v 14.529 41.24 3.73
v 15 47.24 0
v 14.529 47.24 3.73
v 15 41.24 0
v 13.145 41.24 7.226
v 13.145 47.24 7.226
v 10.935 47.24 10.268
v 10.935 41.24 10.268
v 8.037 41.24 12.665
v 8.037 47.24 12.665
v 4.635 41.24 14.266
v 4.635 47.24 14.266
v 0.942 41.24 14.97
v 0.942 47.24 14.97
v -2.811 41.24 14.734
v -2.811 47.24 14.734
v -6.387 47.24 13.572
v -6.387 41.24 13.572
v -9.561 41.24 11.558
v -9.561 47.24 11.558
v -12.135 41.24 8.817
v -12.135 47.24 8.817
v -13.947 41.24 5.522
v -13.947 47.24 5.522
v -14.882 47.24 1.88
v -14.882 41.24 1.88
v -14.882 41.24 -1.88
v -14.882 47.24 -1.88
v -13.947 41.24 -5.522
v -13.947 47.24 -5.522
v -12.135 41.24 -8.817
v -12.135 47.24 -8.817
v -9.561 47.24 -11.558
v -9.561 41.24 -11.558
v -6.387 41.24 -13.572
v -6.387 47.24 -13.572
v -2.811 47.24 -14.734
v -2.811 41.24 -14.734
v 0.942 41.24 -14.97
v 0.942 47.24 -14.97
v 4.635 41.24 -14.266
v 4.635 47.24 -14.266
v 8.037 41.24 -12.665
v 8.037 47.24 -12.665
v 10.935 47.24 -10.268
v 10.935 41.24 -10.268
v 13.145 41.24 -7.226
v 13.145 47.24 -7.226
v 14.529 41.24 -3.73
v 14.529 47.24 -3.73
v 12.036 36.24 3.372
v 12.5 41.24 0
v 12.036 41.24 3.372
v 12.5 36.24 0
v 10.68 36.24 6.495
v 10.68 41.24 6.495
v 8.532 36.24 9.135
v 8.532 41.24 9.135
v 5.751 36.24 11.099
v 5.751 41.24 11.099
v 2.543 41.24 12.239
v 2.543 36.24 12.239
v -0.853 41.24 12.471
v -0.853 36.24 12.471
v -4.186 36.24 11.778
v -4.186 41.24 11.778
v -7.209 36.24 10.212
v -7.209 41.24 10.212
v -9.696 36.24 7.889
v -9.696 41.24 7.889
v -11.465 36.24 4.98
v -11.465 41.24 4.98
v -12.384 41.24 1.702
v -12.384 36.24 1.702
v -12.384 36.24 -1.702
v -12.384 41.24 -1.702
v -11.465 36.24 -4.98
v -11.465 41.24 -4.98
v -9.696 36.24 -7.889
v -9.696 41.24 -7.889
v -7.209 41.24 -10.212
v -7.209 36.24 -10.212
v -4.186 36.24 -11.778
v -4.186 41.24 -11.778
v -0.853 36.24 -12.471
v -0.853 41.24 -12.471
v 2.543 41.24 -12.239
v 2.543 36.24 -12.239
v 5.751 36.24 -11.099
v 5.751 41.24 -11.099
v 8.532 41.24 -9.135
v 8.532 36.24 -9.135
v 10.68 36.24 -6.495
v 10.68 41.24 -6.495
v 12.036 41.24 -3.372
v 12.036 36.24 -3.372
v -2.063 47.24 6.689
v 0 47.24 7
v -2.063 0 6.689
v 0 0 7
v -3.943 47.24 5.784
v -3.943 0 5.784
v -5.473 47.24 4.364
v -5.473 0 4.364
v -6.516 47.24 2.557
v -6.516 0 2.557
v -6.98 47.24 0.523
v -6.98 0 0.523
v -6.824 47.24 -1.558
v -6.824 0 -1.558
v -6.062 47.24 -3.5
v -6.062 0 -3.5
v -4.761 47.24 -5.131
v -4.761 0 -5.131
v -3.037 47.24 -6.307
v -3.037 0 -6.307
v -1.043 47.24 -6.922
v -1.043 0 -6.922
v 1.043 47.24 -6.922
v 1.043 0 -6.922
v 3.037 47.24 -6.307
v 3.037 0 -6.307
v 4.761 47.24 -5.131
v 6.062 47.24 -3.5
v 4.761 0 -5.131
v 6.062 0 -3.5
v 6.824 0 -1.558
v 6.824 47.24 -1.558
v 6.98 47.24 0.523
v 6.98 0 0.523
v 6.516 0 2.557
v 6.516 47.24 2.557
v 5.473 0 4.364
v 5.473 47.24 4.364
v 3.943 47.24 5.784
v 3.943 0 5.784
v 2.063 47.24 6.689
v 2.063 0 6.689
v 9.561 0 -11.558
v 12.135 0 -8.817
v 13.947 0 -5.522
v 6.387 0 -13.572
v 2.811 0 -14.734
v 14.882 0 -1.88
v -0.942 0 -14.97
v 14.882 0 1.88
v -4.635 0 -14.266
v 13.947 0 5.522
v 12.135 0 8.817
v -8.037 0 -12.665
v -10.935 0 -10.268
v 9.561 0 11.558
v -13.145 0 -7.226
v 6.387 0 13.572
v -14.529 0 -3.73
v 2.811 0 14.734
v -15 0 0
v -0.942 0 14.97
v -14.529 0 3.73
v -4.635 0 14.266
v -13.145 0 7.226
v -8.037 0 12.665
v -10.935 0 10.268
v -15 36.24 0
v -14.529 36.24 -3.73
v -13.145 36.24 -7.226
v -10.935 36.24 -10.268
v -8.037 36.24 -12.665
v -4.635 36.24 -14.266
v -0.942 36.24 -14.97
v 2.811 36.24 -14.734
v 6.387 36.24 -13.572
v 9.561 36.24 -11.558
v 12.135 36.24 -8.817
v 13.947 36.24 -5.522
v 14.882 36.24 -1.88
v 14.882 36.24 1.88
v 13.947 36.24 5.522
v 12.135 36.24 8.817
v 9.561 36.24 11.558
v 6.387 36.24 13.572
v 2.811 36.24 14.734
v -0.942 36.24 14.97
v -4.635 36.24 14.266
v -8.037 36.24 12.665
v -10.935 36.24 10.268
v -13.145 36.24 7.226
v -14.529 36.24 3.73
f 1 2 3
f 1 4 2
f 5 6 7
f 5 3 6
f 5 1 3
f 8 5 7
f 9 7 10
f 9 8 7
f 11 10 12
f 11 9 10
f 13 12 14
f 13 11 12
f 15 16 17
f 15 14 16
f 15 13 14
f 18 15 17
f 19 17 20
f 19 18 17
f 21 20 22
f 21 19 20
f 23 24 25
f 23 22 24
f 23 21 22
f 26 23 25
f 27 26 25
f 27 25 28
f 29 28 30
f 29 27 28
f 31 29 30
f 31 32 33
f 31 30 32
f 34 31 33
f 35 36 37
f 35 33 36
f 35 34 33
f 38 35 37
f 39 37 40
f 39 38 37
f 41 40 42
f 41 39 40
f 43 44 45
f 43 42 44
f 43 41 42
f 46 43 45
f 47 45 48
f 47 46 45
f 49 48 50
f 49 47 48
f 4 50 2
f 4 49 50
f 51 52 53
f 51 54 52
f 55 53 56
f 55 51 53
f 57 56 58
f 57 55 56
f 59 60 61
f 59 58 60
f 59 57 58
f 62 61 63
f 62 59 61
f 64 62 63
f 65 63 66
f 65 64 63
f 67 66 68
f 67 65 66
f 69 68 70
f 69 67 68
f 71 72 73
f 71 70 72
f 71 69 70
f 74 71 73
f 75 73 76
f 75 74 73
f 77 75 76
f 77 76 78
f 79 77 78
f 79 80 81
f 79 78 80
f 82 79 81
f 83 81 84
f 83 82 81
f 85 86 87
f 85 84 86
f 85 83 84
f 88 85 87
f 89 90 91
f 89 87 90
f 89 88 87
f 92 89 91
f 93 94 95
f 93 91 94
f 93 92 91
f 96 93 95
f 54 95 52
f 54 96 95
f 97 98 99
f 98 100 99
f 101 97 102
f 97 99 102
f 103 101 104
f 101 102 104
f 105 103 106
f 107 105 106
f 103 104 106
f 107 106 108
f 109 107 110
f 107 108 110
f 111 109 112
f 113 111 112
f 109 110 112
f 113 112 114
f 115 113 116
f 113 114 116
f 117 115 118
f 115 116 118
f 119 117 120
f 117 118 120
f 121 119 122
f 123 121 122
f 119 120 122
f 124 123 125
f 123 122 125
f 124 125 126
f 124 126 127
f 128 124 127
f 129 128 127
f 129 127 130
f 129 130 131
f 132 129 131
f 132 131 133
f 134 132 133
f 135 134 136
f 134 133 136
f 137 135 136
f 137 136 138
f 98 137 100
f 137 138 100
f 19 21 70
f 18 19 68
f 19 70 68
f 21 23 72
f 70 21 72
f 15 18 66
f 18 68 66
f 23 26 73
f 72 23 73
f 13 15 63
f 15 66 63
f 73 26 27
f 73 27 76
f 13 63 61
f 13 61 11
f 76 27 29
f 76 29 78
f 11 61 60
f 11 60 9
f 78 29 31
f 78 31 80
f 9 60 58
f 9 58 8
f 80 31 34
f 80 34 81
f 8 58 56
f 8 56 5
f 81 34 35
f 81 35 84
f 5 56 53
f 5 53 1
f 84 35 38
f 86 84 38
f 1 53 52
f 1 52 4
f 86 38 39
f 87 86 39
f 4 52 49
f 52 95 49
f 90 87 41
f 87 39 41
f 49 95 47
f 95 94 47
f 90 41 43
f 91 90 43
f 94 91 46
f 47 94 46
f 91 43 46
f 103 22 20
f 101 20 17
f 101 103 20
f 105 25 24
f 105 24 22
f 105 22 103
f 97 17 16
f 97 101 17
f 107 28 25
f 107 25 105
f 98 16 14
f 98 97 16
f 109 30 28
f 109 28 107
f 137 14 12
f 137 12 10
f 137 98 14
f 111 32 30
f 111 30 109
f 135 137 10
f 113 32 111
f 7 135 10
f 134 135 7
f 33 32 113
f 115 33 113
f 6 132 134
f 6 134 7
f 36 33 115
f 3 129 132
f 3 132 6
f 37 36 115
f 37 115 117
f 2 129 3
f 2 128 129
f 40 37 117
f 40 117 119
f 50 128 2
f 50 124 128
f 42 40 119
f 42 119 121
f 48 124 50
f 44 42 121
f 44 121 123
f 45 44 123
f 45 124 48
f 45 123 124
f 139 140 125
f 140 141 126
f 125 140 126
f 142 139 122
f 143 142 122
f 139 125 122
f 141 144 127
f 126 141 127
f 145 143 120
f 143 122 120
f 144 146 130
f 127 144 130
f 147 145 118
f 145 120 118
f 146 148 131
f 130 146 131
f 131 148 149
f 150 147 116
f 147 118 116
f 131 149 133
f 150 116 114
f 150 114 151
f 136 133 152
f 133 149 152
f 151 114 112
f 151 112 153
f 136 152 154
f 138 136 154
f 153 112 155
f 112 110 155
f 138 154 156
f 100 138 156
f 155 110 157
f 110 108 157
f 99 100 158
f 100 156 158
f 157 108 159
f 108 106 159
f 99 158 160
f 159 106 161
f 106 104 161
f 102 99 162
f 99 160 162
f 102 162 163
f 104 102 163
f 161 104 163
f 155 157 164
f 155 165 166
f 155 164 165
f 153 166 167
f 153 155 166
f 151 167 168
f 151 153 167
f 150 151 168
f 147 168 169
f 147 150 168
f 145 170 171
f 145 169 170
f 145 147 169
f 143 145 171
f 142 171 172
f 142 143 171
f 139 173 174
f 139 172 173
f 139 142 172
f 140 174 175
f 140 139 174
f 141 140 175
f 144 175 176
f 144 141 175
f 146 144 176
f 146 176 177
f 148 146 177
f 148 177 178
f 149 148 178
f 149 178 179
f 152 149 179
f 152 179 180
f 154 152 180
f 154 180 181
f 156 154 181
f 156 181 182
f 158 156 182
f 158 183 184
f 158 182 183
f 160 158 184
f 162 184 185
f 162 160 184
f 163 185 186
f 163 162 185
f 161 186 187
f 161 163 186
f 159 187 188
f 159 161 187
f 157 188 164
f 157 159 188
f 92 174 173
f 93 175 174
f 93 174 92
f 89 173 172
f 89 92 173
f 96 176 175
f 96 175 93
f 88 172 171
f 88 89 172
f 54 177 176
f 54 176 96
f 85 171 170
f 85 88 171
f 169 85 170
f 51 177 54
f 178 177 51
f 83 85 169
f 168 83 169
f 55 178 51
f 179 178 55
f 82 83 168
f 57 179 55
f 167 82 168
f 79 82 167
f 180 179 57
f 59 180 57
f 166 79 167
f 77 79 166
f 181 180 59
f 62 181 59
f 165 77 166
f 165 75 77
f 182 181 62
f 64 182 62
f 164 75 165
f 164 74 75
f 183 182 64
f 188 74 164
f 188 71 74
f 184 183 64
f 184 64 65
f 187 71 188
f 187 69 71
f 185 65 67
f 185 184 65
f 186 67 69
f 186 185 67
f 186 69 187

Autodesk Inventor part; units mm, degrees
ref_plane "YZ Plane" through (0, 0, 0) normal (1, 0, 0) x (0, 1, 0)
ref_plane "XZ Plane" through (0, 0, 0) normal (0, 1, 0) x (-1, 0, 0)
ref_plane "XY Plane" through (0, 0, 0) normal (0, 0, 1) x (1, 0, 0)
sketch "Esboço1" plane through (0, 0, 0) normal (0, 1, 0) x (-1, 0, 0)
  circle A0 centre (0, 0) radius 15
  dimension "d0" = 30
extrude "Extrusão1" add sketch "Esboço1" along normal blind 36.24
sketch "Esboço2" plane through (0, 36.24, 0) normal (0, 1, 0) x (1, 0, 0)
  circle A0 centre (0, 0) radius 12.5
  dimension "d3" = 25
extrude "Extrusão2" add sketch "Esboço2" along normal blind 5
sketch "Esboço3" plane through (0, 41.24, 0) normal (0, 1, 0) x (1, 0, 0)
  circle A0 centre (0, 0) radius 15
extrude "Extrusão3" add sketch "Esboço3" along normal blind 6
sketch "Sketch5" plane through (0, 47.24, 0) normal (0, 1, 0) x (1, 0, 0)
  circle A0 centre (0, 0) radius 15 projected
hole "Hole2" at (0, 47.24, 0) direction (0, -1, 0) diameter 14 end through all
thread "Thread1" size "M52x4" class "6H" standard "ANSI Metric M Profile" full length
equation "\"d20\" = Espessura"
equation "\"Raio_vergadura\" = Espessura"
equation "\"Largura_alívio_de_vergadura\" = Espessura"
equation "\"Profundidade_alívio_de_vergadura\" = 0.5 * Espessura"
equation "\"Tamanho_alívio_de_dobra\" = 4 * Espessura"
equation "\"Remanescente_mínimo\" = 2 * Espessura"
equation "\"Raiodetransição\" = Raio_vergadura"
equation "\"Tamanho_de_raio_de_Jacobi\" = Raio_vergadura"
equation "\"TamanhoFolga\" = Espessura"
equation "\"Espessura\" = 0.5"
properties part number "Guia do eixo roscado" material "Aço"
